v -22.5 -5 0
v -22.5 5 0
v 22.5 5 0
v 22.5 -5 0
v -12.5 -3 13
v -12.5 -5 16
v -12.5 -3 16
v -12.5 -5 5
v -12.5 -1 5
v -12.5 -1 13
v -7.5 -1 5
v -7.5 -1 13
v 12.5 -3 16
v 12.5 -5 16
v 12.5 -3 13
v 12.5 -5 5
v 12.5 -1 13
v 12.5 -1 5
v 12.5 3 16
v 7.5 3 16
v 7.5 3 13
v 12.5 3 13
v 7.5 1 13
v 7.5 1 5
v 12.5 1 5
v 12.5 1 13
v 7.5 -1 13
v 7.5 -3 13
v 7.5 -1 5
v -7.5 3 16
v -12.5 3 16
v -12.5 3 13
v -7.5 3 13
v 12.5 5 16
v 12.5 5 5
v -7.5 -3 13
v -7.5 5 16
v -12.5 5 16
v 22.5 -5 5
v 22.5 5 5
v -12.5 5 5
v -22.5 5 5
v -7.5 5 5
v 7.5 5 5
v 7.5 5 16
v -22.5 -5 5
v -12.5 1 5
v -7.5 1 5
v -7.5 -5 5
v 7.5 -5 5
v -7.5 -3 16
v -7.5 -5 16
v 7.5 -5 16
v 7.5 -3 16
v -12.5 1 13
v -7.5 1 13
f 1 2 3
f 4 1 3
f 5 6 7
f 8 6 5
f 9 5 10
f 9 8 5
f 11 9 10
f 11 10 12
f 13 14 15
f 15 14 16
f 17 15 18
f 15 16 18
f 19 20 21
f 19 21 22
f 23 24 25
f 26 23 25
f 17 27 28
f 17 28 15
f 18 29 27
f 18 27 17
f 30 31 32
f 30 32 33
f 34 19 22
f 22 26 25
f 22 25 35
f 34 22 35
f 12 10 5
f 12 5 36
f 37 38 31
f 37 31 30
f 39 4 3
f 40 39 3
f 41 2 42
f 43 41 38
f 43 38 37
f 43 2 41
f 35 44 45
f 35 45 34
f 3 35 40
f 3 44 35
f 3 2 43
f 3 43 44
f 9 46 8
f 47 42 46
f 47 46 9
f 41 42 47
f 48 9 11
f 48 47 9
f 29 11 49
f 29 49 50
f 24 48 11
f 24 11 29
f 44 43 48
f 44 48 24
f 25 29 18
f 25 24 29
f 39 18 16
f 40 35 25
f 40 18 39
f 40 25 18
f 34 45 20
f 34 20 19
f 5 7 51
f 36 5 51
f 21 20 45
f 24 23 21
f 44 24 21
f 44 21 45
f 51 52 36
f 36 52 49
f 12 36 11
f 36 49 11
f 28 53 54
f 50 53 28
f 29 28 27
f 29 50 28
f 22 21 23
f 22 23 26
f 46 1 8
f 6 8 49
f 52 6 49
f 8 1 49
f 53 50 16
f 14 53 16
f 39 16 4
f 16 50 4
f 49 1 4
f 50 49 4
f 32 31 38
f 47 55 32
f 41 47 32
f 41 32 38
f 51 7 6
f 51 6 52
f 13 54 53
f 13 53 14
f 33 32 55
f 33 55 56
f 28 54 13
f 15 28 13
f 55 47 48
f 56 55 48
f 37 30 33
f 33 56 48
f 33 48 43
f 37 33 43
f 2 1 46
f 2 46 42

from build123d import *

# Parameters (mm, degrees)
SKETCH_1_W          = 45
SKETCH_1_H          = 10
EXTRUDE_1_DEPTH     = 5
SKETCH_2_W          = 5
SKETCH_2_H          = 4
EXTRUDE_2_DEPTH     = 11
SKETCH_3_W          = 5
SKETCH_3_H          = 2
CUT_EXTRUDE_1_DEPTH = 3
SKETCH_4_W          = 5
SKETCH_4_H          = 2
CUT_EXTRUDE_2_DEPTH = 3
SKETCH_7_W          = 5
SKETCH_7_H          = 4
EXTRUDE_3_DEPTH     = 11
SKETCH_8_W          = 5
SKETCH_8_H          = 2
CUT_EXTRUDE_5_DEPTH = 3
SKETCH_9_W          = 5
SKETCH_9_H          = 2
CUT_EXTRUDE_6_DEPTH = 3


with BuildPart() as part:
    # Эскиз1 → Бобышка-Вытянуть1 (new body)
    with BuildSketch(Plane.XY):
        Rectangle(SKETCH_1_W, SKETCH_1_H)
    extrude(amount=EXTRUDE_1_DEPTH)

    # Эскиз2 → Бобышка-Вытянуть2 (add)
    with BuildSketch(Plane.XY.offset(5)):
        with Locations((-10, 3)):
            Rectangle(SKETCH_2_W, SKETCH_2_H)
        with Locations((10, 3)):
            Rectangle(SKETCH_2_W, SKETCH_2_H)
    extrude(amount=EXTRUDE_2_DEPTH)

    # Эскиз3 → Вырез-Вытянуть1 (cut)
    with BuildSketch(Plane.XY.offset(16)):
        with Locations((-10, 2)):
            Rectangle(SKETCH_3_W, SKETCH_3_H)
    extrude(amount=-CUT_EXTRUDE_1_DEPTH, mode=Mode.SUBTRACT)

    # Эскиз4 → Вырез-Вытянуть2 (cut)
    with BuildSketch(Plane.XY.offset(16)):
        with Locations((10, 2)):
            Rectangle(SKETCH_4_W, SKETCH_4_H)
    extrude(amount=-CUT_EXTRUDE_2_DEPTH, mode=Mode.SUBTRACT)

    # Эскиз7 → Бобышка-Вытянуть3 (add)
    with BuildSketch(Plane.XY.offset(5)):
        with Locations((-10, -3)):
            Rectangle(SKETCH_7_W, SKETCH_7_H)
        with Locations((10, -3)):
            Rectangle(SKETCH_7_W, SKETCH_7_H)
    extrude(amount=EXTRUDE_3_DEPTH)

    # Эскиз8 → Вырез-Вытянуть5 (cut)
    with BuildSketch(Plane.XY.offset(16)):
        with Locations((-10, -2)):
            Rectangle(SKETCH_8_W, SKETCH_8_H)
    extrude(amount=-CUT_EXTRUDE_5_DEPTH, mode=Mode.SUBTRACT)

    # Эскиз9 → Вырез-Вытянуть6 (cut)
    with BuildSketch(Plane.XY.offset(16)):
        with Locations((10, -2)):
            Rectangle(SKETCH_9_W, SKETCH_9_H)
    extrude(amount=-CUT_EXTRUDE_6_DEPTH, mode=Mode.SUBTRACT)


solid = part.part
